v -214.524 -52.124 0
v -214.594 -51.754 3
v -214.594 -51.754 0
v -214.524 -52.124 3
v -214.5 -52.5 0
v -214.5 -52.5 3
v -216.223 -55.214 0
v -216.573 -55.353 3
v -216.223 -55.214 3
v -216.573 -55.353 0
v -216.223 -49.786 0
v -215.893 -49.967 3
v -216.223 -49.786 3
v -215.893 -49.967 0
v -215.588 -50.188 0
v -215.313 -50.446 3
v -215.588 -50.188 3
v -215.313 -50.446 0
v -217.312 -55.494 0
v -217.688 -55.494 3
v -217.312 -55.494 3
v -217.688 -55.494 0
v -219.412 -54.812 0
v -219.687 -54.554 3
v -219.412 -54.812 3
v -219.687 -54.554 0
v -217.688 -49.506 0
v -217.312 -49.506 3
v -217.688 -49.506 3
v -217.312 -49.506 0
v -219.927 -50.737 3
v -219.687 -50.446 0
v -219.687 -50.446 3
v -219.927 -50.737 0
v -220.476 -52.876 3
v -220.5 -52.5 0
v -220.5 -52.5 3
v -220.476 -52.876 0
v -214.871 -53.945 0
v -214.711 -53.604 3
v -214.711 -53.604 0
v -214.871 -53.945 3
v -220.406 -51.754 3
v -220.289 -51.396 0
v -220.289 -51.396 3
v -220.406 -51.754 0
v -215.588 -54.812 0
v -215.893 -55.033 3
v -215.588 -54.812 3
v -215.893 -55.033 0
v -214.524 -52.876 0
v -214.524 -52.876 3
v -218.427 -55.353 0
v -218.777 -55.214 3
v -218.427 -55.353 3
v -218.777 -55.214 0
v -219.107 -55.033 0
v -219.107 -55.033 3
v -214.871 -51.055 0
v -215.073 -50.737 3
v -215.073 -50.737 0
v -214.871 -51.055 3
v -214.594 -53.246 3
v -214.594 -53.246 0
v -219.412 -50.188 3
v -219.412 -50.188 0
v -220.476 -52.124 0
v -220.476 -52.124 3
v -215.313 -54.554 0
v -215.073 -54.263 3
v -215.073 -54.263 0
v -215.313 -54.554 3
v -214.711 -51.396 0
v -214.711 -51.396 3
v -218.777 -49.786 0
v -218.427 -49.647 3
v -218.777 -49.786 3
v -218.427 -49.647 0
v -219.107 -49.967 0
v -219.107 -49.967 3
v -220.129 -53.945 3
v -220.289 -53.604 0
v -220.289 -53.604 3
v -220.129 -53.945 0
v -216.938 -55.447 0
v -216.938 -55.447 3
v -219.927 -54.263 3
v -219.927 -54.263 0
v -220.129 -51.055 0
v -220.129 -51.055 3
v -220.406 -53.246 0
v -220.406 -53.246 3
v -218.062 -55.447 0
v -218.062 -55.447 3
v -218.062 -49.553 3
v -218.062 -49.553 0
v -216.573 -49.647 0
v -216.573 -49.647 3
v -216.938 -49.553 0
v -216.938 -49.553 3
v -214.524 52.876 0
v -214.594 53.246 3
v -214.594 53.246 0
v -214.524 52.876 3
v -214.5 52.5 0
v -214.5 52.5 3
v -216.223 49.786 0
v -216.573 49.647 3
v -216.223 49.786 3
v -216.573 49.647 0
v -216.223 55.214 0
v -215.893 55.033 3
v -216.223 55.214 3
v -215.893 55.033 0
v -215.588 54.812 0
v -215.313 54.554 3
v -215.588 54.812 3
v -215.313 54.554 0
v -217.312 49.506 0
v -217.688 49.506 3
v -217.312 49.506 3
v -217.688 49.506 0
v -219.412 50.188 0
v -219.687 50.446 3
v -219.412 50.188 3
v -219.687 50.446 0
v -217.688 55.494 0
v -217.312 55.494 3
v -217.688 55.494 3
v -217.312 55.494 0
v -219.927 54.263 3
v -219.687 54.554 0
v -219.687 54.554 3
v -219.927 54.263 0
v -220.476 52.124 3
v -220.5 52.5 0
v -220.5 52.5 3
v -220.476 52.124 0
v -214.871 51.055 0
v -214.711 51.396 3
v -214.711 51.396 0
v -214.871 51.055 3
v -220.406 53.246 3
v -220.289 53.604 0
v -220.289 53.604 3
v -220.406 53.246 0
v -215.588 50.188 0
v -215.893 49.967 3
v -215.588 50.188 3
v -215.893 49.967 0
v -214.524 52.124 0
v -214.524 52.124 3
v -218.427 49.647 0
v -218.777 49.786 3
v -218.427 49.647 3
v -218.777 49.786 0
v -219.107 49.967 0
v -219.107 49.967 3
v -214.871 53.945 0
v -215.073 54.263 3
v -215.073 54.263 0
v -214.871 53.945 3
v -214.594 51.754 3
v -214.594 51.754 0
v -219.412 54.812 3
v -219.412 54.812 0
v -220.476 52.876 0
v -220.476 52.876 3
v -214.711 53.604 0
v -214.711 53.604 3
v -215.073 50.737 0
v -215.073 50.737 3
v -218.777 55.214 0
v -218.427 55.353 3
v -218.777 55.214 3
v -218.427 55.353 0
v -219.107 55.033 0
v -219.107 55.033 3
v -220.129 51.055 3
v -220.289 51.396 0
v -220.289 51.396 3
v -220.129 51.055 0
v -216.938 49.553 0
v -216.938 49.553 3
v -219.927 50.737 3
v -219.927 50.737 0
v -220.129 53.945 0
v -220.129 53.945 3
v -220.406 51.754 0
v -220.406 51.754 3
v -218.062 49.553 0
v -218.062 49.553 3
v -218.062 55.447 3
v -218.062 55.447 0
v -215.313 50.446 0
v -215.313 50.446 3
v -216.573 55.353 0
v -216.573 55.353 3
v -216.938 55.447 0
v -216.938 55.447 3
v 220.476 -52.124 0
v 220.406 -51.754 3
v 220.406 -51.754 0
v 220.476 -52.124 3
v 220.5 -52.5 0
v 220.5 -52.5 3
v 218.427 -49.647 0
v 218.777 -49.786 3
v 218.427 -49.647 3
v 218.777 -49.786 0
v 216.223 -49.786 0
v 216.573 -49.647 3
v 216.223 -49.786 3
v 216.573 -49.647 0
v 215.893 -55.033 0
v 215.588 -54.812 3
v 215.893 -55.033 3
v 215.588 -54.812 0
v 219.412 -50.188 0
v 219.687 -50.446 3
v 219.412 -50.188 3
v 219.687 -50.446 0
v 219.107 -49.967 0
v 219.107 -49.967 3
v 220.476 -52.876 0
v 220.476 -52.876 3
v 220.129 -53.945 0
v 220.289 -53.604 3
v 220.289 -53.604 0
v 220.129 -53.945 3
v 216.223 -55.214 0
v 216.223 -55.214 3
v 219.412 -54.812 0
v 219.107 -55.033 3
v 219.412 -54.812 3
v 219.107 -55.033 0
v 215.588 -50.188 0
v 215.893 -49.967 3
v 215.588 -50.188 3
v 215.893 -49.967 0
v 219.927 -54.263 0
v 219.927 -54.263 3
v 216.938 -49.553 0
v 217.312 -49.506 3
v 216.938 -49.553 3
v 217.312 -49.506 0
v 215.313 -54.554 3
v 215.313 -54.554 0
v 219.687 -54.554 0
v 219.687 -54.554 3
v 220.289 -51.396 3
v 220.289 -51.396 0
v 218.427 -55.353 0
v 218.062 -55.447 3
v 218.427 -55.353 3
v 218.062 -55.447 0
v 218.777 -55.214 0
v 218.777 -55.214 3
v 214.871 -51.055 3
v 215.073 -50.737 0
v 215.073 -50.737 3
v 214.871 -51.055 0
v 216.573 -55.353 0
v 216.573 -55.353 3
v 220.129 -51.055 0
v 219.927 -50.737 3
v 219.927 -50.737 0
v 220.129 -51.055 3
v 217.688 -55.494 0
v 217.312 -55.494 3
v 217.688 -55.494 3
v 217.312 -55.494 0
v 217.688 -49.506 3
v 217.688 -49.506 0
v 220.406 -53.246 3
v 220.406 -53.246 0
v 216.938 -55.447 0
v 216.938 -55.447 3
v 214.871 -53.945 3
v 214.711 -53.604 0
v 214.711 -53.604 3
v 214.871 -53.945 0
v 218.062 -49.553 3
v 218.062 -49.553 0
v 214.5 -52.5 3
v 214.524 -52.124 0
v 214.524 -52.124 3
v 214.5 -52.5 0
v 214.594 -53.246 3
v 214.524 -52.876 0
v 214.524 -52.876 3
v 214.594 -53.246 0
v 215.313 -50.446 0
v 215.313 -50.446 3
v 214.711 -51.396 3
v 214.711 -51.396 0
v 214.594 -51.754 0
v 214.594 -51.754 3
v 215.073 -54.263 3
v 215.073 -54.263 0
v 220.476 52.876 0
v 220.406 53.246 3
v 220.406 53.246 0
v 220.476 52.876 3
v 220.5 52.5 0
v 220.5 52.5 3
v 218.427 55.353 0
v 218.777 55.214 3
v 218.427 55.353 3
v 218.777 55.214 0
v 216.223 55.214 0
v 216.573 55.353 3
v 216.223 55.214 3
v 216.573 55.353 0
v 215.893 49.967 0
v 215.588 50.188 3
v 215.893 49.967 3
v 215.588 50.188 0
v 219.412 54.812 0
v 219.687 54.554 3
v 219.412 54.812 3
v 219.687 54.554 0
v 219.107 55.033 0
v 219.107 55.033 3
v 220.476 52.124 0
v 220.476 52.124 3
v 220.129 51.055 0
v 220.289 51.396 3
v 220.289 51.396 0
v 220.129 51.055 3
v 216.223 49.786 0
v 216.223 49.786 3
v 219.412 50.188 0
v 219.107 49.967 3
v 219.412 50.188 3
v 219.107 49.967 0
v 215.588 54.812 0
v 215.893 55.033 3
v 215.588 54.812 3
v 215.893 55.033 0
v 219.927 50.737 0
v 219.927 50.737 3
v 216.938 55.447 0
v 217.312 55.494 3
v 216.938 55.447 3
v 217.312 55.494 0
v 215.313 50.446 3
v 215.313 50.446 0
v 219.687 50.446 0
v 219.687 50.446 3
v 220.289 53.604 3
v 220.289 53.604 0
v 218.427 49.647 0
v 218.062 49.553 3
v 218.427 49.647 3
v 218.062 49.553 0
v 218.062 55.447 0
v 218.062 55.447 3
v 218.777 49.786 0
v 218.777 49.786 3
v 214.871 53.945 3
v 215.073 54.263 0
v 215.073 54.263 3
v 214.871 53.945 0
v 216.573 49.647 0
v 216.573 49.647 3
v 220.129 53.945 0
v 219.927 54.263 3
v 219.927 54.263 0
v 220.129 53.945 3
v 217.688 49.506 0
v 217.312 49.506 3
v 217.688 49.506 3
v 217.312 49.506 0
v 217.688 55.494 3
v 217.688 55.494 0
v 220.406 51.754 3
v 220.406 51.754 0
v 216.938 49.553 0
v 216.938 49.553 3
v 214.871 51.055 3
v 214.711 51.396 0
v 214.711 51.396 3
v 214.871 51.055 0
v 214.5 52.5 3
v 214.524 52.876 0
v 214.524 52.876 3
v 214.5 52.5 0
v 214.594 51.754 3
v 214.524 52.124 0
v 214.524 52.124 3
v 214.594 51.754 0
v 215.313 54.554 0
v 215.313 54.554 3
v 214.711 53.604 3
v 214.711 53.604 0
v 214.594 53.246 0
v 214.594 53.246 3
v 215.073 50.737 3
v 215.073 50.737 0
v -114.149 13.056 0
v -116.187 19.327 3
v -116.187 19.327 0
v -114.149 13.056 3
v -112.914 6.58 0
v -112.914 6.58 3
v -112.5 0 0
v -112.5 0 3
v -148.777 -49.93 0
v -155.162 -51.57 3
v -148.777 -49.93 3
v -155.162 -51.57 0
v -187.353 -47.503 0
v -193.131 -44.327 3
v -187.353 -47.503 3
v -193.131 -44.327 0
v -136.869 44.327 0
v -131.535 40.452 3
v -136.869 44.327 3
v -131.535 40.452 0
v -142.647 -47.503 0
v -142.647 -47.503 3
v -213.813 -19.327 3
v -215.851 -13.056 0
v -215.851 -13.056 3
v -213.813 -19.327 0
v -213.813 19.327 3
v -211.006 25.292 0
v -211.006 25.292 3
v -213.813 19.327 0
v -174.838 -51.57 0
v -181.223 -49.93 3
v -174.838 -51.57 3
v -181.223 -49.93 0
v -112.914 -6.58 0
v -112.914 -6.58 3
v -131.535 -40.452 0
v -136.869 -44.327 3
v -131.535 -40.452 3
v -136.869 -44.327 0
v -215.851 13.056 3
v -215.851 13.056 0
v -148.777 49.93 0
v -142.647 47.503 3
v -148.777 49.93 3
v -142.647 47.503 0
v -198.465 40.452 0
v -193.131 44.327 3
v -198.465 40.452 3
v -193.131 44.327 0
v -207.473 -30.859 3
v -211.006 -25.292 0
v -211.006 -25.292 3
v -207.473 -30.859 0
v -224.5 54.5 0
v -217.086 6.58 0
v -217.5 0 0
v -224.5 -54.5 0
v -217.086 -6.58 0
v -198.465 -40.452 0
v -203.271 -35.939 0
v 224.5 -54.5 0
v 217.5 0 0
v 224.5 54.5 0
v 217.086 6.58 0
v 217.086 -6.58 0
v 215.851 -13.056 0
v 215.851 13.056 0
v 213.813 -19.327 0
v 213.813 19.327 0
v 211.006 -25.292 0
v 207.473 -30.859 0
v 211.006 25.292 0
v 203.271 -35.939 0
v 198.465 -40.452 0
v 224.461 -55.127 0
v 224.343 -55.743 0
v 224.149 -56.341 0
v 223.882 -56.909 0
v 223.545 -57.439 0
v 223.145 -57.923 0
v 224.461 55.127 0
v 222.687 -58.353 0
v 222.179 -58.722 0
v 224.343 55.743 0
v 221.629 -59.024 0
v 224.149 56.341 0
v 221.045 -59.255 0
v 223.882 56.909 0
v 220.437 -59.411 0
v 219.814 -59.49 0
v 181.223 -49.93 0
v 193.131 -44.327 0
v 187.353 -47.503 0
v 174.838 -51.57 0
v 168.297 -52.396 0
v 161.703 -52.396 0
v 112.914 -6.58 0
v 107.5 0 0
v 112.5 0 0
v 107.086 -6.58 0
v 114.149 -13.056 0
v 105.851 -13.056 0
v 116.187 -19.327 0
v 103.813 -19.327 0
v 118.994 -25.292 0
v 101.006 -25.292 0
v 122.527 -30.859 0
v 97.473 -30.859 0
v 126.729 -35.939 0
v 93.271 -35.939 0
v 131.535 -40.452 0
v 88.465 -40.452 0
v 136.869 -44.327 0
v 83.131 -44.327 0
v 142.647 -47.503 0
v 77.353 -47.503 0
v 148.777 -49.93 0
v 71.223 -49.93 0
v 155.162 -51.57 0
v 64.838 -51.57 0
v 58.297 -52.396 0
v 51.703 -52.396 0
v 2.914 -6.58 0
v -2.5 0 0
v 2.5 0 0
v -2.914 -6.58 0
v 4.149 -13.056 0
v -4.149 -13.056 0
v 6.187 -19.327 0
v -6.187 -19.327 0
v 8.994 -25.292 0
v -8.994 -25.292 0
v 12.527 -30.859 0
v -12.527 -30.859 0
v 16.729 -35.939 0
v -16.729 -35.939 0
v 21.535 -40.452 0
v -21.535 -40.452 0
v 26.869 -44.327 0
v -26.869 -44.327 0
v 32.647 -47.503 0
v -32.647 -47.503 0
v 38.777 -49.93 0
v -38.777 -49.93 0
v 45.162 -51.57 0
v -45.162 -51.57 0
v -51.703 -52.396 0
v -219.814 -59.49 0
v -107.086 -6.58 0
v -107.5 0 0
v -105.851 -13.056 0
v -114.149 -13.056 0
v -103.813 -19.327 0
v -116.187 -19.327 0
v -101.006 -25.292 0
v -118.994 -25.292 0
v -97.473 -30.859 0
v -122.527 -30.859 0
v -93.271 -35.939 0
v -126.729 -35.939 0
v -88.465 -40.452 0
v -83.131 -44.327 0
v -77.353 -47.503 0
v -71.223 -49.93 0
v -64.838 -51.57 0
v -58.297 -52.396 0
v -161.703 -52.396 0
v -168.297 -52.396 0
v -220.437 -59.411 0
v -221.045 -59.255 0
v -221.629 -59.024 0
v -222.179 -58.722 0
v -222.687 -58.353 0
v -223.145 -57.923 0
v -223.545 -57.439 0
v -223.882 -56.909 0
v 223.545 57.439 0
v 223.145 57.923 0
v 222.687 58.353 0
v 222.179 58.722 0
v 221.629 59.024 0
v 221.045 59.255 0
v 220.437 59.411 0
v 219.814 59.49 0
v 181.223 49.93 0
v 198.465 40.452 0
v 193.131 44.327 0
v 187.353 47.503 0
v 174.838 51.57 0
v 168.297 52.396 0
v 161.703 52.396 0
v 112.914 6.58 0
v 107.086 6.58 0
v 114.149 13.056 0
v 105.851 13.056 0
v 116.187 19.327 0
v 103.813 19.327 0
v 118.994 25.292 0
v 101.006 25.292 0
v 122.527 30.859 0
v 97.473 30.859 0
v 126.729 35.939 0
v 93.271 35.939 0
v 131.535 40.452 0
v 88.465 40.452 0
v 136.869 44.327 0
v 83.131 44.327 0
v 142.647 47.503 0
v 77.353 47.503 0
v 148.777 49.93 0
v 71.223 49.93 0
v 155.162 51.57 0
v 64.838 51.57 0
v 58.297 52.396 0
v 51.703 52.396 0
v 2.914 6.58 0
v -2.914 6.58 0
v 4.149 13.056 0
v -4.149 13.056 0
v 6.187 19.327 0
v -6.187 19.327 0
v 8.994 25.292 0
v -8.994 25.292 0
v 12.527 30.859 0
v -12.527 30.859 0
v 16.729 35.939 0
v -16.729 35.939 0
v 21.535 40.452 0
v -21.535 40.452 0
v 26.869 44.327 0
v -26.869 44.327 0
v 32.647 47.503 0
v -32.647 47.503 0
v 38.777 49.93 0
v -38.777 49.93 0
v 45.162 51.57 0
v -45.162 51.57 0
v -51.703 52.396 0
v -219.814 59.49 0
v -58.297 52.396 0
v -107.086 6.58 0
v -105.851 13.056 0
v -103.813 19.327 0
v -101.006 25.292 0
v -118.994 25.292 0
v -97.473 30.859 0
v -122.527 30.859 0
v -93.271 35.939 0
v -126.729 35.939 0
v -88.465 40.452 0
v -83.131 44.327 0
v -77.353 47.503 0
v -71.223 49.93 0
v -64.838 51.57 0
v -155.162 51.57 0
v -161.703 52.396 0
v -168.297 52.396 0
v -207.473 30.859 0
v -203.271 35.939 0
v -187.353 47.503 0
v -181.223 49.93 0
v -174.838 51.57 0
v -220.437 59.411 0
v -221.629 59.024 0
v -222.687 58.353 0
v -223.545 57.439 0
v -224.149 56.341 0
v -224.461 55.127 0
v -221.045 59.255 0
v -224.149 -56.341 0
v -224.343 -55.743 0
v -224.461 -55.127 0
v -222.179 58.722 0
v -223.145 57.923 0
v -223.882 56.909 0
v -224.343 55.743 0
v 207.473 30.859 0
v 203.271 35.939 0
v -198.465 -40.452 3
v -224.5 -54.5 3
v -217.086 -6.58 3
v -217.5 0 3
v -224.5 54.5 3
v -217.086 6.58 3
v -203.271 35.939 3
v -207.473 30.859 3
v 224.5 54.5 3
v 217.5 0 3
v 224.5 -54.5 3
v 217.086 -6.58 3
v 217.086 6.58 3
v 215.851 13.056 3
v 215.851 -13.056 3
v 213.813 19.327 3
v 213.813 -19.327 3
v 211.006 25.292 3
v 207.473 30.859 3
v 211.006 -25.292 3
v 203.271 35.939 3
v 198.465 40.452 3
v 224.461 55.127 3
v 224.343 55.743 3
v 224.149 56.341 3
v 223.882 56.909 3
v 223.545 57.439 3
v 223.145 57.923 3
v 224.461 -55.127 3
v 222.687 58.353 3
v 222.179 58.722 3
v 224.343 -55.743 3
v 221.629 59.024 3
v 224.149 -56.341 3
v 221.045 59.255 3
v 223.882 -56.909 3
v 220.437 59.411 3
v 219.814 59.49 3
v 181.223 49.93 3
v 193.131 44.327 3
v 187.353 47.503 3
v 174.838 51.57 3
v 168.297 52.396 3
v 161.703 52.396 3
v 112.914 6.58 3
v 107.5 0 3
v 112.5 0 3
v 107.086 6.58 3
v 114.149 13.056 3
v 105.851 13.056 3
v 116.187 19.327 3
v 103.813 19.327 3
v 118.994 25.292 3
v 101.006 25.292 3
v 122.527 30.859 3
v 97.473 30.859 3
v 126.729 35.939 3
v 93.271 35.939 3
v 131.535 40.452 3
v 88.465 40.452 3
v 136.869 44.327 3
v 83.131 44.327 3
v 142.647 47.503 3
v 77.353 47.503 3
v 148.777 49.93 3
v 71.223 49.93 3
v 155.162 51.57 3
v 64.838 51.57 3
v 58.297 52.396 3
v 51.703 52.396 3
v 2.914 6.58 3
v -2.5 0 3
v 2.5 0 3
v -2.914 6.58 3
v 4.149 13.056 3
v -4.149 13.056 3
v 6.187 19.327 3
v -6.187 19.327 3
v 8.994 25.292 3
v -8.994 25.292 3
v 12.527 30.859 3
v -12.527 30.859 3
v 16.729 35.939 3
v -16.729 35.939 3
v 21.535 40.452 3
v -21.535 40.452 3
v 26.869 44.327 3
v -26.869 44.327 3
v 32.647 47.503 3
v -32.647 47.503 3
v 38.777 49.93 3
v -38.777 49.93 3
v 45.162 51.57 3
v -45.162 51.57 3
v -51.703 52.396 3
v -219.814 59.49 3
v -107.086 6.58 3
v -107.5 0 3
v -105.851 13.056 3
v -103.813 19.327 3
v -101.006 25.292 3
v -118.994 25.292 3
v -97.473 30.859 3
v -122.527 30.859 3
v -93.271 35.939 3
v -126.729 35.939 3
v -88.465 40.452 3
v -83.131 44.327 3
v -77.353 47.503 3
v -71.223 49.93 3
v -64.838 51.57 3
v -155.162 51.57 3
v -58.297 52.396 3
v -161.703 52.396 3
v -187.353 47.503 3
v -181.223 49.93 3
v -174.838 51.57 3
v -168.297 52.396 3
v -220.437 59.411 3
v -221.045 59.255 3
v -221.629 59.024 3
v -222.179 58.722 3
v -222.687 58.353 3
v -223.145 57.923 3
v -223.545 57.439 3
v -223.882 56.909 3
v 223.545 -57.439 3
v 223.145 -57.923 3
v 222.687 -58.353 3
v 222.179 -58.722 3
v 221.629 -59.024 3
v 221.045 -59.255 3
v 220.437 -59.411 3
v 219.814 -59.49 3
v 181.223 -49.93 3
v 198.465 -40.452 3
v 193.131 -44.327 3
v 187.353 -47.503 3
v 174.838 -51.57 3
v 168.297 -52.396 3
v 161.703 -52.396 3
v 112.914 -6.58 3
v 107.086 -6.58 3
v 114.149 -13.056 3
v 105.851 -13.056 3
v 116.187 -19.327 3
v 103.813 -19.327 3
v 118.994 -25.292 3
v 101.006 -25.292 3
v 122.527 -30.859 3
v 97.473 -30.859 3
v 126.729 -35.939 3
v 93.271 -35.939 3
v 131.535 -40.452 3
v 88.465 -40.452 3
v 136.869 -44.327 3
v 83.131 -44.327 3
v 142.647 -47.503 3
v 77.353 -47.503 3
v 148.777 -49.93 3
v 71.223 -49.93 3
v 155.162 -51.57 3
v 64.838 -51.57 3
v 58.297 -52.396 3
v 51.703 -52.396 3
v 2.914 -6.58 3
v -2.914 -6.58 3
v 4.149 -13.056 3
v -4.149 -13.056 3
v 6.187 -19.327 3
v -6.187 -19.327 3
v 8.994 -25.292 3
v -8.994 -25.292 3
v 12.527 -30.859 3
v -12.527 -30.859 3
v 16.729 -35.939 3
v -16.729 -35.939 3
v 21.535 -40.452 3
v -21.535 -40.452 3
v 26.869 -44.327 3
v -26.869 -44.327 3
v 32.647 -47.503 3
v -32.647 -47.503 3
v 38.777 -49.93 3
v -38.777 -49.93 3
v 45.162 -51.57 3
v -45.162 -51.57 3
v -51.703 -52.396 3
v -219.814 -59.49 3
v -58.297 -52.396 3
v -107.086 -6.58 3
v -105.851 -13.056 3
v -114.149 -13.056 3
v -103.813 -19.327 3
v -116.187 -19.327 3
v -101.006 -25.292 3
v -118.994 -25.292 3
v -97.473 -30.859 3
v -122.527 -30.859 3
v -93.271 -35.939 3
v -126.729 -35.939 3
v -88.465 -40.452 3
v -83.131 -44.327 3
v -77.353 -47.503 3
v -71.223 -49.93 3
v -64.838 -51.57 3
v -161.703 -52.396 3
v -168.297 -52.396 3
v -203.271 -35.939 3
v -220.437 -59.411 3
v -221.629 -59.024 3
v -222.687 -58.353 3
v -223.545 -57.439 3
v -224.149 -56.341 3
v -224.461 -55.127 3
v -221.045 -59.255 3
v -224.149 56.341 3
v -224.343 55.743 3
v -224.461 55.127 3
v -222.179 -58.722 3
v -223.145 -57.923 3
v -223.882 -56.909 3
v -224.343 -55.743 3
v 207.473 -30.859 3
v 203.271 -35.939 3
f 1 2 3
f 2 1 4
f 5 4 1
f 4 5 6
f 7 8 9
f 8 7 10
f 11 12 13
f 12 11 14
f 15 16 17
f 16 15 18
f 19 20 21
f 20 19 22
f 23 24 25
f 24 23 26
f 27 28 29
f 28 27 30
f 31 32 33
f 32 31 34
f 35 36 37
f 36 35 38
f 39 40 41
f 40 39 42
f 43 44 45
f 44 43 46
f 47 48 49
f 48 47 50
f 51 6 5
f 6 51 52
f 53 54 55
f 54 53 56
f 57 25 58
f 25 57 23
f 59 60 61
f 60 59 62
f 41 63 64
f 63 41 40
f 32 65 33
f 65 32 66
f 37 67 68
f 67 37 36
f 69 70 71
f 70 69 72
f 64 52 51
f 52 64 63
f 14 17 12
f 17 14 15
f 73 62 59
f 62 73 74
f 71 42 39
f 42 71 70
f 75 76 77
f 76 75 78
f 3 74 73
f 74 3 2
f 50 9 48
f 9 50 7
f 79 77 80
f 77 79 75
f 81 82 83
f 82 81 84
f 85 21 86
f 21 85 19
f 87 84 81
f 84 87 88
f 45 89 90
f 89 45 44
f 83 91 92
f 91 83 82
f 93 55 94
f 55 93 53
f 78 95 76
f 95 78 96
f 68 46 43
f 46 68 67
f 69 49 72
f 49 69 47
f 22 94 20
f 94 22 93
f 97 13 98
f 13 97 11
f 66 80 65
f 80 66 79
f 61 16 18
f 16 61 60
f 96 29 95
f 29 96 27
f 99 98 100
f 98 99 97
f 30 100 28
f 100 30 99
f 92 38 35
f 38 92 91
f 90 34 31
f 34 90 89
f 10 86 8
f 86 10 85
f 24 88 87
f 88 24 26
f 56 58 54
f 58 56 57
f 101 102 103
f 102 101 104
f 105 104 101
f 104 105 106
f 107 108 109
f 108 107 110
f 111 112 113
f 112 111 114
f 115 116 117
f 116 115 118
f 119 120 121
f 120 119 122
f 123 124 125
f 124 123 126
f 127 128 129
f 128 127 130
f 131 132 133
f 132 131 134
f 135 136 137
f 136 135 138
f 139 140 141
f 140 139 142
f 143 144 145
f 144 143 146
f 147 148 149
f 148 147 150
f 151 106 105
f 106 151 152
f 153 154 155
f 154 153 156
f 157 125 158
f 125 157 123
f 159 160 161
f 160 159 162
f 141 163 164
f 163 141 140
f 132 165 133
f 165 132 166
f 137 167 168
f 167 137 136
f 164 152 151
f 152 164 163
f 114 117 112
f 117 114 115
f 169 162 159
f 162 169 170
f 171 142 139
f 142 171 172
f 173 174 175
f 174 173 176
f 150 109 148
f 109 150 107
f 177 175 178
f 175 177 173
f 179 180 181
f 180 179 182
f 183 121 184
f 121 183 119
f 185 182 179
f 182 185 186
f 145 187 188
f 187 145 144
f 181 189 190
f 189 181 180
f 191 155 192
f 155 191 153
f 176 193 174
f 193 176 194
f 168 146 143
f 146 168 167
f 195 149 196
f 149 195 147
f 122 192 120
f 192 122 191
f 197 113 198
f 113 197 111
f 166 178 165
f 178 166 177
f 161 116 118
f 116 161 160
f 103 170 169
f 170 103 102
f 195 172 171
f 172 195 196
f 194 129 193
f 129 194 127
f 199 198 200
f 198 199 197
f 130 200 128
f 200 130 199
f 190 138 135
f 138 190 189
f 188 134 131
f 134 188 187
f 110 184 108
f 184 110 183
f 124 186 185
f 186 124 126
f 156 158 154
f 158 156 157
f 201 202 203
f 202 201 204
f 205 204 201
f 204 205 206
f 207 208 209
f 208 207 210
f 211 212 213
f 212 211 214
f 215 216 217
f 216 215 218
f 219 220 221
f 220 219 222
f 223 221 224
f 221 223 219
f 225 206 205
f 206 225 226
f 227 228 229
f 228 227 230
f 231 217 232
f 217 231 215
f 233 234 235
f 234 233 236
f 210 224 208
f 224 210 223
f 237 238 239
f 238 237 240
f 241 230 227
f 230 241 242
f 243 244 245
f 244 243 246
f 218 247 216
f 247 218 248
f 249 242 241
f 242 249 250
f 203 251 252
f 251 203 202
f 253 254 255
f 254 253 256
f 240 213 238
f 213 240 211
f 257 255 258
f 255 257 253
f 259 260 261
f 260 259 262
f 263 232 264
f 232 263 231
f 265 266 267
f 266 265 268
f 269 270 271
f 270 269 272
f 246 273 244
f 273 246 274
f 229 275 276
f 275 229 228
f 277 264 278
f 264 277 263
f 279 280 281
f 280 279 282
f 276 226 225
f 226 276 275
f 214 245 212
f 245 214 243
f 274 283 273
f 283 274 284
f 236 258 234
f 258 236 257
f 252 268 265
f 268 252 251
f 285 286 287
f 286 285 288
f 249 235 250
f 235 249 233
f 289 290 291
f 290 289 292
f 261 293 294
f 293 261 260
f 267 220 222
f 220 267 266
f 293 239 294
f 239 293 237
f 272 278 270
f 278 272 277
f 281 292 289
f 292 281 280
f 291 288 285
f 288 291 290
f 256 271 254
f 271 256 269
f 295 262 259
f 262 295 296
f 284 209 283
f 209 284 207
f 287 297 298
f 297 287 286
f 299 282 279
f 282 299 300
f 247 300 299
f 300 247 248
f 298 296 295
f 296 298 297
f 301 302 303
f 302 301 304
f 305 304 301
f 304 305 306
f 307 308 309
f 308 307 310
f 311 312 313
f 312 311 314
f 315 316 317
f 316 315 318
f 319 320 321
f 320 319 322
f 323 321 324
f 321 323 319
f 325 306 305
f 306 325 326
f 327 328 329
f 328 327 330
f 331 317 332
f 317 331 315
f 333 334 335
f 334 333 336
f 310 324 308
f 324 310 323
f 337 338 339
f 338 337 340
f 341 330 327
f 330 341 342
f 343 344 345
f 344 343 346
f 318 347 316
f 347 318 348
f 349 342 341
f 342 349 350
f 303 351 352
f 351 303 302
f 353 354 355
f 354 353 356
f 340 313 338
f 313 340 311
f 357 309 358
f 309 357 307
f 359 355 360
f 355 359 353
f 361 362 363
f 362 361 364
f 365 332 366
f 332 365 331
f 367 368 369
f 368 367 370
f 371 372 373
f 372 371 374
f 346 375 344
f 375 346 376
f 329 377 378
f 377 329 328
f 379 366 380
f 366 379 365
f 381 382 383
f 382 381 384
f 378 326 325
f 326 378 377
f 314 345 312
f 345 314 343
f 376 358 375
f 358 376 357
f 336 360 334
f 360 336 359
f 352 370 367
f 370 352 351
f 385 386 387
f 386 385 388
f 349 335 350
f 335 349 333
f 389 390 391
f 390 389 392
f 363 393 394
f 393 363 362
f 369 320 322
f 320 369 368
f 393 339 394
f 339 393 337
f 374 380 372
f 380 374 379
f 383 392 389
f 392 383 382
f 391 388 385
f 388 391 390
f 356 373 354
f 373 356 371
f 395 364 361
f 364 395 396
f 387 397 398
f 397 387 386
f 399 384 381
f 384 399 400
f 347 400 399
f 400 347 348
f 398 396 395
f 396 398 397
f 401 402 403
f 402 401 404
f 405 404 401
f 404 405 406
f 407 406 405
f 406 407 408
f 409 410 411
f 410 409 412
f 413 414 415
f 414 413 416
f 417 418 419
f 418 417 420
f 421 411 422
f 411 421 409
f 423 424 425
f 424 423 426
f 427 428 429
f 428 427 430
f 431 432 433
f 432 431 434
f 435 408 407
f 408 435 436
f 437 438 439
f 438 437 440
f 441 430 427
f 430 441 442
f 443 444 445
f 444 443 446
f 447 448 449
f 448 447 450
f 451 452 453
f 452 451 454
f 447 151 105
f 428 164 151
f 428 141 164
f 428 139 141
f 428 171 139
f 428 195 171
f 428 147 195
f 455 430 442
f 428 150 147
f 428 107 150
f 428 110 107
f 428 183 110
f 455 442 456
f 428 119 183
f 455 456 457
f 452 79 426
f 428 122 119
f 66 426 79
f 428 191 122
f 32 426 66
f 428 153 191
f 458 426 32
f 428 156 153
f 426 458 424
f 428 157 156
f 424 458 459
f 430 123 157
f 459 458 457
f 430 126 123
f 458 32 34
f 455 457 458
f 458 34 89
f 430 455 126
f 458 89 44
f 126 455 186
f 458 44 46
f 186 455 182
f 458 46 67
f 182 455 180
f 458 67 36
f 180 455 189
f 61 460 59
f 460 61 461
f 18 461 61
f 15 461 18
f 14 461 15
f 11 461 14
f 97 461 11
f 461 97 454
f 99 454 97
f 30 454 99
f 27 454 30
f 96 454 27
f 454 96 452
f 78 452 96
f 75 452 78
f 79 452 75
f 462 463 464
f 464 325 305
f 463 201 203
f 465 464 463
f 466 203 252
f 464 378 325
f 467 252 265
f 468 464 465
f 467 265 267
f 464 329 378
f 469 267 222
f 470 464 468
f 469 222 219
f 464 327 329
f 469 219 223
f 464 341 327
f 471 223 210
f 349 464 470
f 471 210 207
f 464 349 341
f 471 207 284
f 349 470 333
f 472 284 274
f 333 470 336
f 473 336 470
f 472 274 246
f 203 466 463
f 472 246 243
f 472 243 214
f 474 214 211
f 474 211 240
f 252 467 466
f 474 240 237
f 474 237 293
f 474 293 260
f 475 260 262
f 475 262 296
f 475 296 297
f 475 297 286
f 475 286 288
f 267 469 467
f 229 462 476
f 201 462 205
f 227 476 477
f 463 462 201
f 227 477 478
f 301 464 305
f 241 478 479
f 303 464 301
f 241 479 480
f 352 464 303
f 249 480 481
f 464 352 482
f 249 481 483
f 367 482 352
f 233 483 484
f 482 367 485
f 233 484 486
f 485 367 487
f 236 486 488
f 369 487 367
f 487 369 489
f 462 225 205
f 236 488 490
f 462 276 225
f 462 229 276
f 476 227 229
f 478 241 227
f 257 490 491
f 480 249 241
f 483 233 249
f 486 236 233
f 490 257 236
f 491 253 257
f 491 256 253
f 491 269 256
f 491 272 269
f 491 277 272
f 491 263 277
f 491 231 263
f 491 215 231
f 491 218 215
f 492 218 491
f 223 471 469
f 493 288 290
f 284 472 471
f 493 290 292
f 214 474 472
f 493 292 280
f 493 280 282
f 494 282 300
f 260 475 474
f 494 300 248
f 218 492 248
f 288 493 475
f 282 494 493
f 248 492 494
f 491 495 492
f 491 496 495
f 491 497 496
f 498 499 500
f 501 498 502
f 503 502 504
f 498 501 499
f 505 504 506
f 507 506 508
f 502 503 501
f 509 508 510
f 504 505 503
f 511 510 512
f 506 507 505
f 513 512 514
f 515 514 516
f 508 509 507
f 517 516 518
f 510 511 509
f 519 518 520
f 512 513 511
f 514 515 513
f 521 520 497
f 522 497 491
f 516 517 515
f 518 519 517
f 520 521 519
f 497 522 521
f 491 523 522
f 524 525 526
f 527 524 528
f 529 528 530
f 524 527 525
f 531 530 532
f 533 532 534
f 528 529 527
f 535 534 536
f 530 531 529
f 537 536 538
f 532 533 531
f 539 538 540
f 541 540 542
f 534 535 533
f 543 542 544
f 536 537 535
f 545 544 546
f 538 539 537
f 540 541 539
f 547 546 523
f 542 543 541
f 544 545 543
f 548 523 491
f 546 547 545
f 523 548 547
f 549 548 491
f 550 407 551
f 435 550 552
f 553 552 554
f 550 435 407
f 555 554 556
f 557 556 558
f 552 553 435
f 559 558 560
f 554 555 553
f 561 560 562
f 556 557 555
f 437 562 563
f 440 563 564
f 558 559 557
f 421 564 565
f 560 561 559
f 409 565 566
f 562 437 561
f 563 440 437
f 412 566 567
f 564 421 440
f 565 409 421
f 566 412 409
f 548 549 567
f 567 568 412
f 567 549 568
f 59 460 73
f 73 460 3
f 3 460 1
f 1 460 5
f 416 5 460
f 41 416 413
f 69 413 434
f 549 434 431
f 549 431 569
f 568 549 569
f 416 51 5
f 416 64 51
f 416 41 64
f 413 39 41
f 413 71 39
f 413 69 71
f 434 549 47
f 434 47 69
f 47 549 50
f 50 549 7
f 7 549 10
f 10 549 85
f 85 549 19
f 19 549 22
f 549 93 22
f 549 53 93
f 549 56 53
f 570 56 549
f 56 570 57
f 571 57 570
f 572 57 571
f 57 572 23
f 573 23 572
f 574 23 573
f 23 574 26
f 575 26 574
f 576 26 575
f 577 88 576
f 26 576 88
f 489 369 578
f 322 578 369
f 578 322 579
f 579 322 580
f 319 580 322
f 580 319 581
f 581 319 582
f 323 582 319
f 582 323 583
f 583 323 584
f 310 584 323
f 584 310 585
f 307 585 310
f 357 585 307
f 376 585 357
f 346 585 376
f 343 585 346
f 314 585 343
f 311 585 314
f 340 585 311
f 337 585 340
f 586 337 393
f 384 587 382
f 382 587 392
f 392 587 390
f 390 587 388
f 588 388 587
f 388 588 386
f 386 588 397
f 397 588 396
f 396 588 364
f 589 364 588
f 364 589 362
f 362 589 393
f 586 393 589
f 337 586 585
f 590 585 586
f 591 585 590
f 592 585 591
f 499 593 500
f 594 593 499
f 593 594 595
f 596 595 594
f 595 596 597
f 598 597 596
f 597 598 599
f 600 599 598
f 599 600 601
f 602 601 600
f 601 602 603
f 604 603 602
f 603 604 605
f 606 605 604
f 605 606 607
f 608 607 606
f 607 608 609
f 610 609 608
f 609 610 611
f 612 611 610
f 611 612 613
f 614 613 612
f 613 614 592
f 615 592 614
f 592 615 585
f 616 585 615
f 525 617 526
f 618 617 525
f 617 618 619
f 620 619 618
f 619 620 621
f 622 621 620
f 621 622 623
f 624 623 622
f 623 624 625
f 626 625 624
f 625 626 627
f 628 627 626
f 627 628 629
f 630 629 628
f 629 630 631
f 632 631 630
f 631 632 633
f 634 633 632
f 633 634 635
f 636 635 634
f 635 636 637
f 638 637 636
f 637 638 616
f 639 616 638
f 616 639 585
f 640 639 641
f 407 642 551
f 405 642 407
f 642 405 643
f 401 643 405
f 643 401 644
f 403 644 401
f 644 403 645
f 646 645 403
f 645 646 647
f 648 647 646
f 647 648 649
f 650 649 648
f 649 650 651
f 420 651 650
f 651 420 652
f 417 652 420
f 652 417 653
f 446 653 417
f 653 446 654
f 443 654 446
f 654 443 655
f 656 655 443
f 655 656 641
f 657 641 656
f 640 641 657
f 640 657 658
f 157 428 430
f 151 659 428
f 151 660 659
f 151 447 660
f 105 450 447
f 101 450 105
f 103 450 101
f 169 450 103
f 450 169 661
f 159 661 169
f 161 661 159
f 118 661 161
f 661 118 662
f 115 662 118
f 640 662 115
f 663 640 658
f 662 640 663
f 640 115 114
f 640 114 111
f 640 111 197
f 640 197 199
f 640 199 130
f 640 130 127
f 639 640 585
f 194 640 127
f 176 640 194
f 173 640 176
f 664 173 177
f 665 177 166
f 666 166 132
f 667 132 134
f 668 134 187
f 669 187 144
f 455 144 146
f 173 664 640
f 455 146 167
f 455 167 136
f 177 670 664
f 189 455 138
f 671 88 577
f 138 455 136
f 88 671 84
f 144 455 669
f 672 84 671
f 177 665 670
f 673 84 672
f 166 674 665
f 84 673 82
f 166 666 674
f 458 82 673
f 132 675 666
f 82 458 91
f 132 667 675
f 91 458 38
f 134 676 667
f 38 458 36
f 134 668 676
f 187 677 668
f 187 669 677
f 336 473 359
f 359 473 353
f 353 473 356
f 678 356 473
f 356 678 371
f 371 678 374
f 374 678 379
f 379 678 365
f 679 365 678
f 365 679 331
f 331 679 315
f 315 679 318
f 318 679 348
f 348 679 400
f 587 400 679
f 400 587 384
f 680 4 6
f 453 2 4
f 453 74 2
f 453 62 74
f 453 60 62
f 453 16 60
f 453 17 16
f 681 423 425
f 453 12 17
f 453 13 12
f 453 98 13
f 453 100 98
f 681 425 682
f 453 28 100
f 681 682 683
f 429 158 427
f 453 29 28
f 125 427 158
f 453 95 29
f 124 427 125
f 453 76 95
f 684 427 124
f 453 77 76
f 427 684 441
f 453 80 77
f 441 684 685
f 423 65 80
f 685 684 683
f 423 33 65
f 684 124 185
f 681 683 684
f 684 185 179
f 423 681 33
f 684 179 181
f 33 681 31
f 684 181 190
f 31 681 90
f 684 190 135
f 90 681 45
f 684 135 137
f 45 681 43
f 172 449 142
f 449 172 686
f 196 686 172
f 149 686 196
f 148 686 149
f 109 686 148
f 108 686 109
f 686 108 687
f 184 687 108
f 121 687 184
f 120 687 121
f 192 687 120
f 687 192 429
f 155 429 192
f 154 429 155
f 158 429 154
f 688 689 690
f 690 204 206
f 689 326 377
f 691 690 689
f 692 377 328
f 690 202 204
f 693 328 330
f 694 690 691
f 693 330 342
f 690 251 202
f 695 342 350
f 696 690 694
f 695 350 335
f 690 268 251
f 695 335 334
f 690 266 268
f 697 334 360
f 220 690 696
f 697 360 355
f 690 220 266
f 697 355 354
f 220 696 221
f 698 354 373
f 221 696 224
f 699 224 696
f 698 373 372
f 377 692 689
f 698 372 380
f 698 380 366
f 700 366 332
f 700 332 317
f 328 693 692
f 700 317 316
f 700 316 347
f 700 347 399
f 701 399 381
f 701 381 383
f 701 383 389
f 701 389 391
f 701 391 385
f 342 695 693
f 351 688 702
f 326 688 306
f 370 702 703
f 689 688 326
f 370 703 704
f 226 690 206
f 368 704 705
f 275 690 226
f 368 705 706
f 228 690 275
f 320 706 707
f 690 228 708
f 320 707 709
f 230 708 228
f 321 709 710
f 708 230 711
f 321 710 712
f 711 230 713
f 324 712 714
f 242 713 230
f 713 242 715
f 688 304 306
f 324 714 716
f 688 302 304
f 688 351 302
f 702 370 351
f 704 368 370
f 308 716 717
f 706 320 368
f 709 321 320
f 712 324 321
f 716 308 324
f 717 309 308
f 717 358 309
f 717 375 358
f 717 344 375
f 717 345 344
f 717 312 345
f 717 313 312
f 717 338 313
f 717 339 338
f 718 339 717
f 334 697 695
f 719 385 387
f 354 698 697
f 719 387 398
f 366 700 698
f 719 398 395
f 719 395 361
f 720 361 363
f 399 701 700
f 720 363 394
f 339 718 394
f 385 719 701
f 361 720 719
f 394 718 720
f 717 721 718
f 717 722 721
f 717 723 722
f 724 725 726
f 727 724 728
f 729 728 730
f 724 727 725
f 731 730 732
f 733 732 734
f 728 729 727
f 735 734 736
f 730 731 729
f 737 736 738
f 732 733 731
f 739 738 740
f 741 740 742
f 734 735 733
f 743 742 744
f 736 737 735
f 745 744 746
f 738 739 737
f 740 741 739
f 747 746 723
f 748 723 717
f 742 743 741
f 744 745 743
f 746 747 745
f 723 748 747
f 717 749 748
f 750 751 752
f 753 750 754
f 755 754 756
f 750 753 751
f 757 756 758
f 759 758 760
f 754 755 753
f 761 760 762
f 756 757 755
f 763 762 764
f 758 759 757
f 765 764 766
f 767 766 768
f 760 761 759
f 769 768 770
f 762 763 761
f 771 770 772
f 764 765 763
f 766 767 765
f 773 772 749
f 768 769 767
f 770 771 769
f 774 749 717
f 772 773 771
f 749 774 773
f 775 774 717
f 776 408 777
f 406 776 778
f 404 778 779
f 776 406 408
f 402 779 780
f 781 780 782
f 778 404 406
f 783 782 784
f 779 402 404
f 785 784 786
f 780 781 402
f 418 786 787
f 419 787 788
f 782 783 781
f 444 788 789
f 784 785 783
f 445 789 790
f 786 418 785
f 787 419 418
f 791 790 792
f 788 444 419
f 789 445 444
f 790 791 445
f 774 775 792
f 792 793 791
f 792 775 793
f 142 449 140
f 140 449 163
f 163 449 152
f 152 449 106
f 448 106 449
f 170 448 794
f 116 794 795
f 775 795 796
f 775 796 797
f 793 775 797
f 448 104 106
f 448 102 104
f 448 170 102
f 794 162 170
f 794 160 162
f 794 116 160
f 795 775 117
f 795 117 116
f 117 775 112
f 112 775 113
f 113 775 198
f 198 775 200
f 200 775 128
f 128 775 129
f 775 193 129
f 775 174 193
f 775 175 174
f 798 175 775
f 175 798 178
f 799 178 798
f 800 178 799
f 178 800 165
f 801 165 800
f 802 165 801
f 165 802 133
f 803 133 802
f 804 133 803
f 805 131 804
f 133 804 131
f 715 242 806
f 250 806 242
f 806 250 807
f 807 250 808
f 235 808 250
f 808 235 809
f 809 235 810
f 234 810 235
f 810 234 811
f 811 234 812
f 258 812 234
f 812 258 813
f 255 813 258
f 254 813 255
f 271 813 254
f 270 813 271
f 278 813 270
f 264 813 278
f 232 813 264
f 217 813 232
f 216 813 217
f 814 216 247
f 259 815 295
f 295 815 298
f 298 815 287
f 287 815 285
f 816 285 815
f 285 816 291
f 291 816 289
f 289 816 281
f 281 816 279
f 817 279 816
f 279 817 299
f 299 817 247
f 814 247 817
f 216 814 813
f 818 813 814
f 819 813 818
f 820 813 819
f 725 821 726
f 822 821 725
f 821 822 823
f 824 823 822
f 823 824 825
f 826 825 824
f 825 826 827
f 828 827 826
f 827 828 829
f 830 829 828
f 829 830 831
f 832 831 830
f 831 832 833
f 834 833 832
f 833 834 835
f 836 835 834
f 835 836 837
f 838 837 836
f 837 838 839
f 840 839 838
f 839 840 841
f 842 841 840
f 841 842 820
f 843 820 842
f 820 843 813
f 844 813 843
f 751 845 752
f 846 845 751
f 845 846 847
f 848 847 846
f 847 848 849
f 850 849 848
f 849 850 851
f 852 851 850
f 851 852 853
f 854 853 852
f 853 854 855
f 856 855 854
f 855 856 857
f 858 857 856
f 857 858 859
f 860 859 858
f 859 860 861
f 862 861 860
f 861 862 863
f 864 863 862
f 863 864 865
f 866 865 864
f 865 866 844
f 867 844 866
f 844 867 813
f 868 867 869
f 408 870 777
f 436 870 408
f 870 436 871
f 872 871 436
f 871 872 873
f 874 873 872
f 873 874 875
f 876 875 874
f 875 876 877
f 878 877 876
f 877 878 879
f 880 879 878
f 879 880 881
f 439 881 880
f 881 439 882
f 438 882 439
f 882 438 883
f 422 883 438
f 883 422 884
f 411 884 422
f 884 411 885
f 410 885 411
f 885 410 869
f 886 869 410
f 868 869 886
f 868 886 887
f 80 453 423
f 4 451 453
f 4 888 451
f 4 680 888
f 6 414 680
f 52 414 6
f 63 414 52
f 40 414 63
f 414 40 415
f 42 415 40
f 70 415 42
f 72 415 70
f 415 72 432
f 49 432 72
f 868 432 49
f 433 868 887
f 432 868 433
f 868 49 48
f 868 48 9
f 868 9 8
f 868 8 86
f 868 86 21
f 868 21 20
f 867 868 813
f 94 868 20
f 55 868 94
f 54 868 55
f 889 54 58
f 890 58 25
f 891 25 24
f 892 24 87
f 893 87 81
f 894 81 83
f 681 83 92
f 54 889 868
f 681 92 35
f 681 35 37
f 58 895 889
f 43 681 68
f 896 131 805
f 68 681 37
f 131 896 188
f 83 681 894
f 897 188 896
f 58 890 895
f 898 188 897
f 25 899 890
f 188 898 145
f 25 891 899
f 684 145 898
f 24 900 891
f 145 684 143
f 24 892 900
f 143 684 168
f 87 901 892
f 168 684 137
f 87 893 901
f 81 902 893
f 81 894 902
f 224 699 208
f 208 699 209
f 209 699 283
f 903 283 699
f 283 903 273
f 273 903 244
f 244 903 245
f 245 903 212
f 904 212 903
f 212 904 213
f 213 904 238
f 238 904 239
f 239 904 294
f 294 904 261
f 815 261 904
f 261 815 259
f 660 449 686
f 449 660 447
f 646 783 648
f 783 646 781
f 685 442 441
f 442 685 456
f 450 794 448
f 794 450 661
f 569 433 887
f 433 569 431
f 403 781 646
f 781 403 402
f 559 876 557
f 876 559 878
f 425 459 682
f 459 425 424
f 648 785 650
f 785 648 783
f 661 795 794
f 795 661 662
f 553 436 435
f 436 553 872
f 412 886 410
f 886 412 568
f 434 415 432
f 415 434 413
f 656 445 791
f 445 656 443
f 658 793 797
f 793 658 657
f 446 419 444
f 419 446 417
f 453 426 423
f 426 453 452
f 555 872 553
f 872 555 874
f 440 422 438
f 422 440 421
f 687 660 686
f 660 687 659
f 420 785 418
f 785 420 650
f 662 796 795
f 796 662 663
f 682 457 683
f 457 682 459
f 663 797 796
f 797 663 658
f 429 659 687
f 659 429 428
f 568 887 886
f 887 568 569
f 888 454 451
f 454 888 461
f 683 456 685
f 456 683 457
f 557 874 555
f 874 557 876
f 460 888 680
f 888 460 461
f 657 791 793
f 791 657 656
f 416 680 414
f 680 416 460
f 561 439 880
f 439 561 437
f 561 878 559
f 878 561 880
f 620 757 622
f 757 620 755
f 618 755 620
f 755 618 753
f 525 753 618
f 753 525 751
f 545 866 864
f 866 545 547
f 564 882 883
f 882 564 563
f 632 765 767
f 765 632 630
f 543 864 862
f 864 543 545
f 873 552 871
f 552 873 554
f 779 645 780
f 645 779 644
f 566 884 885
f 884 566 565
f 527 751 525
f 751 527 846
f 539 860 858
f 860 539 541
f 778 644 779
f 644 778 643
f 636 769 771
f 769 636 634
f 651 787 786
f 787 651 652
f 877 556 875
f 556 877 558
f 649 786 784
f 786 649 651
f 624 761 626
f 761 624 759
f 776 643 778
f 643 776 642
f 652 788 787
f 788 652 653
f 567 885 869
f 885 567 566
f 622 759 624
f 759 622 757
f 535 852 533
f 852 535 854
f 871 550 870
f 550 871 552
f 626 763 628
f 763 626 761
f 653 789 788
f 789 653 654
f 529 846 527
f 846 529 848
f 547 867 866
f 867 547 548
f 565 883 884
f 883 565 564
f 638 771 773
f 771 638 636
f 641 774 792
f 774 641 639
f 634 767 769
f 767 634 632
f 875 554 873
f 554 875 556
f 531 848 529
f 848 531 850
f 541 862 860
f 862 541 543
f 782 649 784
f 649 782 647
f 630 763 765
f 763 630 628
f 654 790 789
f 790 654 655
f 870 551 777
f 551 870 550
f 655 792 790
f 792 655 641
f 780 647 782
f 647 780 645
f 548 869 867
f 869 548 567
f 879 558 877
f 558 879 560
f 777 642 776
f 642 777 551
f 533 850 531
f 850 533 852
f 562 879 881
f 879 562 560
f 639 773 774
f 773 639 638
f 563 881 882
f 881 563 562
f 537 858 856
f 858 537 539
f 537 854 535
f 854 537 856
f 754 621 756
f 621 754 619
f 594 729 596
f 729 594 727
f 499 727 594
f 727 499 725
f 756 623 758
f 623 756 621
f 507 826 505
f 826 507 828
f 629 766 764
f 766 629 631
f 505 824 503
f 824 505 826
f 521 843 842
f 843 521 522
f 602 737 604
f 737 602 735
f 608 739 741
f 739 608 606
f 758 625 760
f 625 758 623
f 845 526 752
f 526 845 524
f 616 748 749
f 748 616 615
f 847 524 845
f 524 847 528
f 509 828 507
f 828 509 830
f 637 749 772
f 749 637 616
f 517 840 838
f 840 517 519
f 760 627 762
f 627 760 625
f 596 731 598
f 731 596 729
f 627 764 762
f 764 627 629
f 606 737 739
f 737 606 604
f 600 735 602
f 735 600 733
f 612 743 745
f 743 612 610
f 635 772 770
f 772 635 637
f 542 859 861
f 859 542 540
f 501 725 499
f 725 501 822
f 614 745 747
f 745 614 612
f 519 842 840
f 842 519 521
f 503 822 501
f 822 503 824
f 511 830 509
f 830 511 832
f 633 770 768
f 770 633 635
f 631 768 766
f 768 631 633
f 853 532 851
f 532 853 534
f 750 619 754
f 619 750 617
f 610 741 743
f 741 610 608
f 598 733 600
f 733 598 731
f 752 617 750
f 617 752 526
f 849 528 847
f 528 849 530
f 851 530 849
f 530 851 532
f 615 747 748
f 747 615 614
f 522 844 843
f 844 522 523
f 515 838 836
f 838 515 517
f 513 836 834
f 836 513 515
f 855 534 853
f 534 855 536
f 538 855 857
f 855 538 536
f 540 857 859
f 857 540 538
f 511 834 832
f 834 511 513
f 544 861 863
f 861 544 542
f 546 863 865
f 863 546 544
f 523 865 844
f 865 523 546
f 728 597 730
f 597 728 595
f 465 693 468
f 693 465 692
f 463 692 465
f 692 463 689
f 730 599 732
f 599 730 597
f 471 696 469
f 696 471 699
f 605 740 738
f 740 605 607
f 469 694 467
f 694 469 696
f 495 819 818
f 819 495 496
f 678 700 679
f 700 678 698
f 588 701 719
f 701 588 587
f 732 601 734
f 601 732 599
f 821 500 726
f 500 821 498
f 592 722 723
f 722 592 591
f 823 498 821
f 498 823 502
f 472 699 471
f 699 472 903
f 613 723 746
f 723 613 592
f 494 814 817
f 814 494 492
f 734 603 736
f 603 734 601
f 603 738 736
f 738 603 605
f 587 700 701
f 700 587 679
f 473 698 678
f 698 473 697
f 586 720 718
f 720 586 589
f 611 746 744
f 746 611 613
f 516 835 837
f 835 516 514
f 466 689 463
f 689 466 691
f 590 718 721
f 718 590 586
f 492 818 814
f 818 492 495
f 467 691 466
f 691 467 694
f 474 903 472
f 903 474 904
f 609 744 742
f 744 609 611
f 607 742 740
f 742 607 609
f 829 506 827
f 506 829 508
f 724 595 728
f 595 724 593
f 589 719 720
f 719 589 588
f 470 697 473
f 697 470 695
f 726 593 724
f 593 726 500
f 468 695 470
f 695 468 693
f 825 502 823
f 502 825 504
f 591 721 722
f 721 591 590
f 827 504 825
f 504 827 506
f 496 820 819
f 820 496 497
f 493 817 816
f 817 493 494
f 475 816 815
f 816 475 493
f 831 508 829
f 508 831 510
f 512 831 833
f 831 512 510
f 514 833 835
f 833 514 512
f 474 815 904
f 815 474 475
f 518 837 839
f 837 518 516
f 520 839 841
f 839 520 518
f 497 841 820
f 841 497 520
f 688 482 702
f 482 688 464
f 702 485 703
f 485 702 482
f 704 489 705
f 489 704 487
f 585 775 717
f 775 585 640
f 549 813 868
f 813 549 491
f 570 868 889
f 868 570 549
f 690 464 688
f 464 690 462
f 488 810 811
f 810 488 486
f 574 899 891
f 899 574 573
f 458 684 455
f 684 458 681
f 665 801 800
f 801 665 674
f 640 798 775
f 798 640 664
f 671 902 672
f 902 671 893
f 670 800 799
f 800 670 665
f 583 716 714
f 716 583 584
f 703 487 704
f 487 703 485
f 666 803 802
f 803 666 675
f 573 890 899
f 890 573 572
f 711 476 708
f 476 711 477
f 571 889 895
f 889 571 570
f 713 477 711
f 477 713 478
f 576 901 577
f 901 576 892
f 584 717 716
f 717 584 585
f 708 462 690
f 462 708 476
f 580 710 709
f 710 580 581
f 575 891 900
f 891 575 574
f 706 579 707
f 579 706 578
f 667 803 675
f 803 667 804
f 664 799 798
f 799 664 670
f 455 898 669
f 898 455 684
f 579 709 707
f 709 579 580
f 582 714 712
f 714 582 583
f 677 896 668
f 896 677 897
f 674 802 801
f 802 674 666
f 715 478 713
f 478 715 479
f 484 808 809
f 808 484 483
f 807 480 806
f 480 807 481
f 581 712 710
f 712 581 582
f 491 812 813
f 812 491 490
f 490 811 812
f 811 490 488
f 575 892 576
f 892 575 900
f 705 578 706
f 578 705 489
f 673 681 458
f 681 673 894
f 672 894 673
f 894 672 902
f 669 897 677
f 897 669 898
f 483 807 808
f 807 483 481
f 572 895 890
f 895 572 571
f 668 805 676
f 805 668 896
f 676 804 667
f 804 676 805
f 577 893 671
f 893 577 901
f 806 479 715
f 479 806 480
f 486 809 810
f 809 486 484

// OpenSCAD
$fn = 50;


difference() {
	union() {
		hull() {
			translate(v = [-219.5000000000, 54.5000000000, 0]) {
				cylinder(h = 3, r = 5);
			}
			translate(v = [219.5000000000, 54.5000000000, 0]) {
				cylinder(h = 3, r = 5);
			}
			translate(v = [-219.5000000000, -54.5000000000, 0]) {
				cylinder(h = 3, r = 5);
			}
			translate(v = [219.5000000000, -54.5000000000, 0]) {
				cylinder(h = 3, r = 5);
			}
		}
	}
	union() {
		#translate(v = [-217.5000000000, -52.5000000000, -100.0000000000]) {
			cylinder(h = 200, r = 3.0000000000);
		}
		#translate(v = [-217.5000000000, 52.5000000000, -100.0000000000]) {
			cylinder(h = 200, r = 3.0000000000);
		}
		#translate(v = [217.5000000000, -52.5000000000, -100.0000000000]) {
			cylinder(h = 200, r = 3.0000000000);
		}
		#translate(v = [217.5000000000, 52.5000000000, -100.0000000000]) {
			cylinder(h = 200, r = 3.0000000000);
		}
		#translate(v = [-165.0000000000, 0, 0]) {
			cylinder(h = 3, r = 52.5000000000);
		}
		#translate(v = [-55.0000000000, 0, 0]) {
			cylinder(h = 3, r = 52.5000000000);
		}
		#translate(v = [55.0000000000, 0, 0]) {
			cylinder(h = 3, r = 52.5000000000);
		}
		#translate(v = [165.0000000000, 0, 0]) {
			cylinder(h = 3, r = 52.5000000000);
		}
	}
}
